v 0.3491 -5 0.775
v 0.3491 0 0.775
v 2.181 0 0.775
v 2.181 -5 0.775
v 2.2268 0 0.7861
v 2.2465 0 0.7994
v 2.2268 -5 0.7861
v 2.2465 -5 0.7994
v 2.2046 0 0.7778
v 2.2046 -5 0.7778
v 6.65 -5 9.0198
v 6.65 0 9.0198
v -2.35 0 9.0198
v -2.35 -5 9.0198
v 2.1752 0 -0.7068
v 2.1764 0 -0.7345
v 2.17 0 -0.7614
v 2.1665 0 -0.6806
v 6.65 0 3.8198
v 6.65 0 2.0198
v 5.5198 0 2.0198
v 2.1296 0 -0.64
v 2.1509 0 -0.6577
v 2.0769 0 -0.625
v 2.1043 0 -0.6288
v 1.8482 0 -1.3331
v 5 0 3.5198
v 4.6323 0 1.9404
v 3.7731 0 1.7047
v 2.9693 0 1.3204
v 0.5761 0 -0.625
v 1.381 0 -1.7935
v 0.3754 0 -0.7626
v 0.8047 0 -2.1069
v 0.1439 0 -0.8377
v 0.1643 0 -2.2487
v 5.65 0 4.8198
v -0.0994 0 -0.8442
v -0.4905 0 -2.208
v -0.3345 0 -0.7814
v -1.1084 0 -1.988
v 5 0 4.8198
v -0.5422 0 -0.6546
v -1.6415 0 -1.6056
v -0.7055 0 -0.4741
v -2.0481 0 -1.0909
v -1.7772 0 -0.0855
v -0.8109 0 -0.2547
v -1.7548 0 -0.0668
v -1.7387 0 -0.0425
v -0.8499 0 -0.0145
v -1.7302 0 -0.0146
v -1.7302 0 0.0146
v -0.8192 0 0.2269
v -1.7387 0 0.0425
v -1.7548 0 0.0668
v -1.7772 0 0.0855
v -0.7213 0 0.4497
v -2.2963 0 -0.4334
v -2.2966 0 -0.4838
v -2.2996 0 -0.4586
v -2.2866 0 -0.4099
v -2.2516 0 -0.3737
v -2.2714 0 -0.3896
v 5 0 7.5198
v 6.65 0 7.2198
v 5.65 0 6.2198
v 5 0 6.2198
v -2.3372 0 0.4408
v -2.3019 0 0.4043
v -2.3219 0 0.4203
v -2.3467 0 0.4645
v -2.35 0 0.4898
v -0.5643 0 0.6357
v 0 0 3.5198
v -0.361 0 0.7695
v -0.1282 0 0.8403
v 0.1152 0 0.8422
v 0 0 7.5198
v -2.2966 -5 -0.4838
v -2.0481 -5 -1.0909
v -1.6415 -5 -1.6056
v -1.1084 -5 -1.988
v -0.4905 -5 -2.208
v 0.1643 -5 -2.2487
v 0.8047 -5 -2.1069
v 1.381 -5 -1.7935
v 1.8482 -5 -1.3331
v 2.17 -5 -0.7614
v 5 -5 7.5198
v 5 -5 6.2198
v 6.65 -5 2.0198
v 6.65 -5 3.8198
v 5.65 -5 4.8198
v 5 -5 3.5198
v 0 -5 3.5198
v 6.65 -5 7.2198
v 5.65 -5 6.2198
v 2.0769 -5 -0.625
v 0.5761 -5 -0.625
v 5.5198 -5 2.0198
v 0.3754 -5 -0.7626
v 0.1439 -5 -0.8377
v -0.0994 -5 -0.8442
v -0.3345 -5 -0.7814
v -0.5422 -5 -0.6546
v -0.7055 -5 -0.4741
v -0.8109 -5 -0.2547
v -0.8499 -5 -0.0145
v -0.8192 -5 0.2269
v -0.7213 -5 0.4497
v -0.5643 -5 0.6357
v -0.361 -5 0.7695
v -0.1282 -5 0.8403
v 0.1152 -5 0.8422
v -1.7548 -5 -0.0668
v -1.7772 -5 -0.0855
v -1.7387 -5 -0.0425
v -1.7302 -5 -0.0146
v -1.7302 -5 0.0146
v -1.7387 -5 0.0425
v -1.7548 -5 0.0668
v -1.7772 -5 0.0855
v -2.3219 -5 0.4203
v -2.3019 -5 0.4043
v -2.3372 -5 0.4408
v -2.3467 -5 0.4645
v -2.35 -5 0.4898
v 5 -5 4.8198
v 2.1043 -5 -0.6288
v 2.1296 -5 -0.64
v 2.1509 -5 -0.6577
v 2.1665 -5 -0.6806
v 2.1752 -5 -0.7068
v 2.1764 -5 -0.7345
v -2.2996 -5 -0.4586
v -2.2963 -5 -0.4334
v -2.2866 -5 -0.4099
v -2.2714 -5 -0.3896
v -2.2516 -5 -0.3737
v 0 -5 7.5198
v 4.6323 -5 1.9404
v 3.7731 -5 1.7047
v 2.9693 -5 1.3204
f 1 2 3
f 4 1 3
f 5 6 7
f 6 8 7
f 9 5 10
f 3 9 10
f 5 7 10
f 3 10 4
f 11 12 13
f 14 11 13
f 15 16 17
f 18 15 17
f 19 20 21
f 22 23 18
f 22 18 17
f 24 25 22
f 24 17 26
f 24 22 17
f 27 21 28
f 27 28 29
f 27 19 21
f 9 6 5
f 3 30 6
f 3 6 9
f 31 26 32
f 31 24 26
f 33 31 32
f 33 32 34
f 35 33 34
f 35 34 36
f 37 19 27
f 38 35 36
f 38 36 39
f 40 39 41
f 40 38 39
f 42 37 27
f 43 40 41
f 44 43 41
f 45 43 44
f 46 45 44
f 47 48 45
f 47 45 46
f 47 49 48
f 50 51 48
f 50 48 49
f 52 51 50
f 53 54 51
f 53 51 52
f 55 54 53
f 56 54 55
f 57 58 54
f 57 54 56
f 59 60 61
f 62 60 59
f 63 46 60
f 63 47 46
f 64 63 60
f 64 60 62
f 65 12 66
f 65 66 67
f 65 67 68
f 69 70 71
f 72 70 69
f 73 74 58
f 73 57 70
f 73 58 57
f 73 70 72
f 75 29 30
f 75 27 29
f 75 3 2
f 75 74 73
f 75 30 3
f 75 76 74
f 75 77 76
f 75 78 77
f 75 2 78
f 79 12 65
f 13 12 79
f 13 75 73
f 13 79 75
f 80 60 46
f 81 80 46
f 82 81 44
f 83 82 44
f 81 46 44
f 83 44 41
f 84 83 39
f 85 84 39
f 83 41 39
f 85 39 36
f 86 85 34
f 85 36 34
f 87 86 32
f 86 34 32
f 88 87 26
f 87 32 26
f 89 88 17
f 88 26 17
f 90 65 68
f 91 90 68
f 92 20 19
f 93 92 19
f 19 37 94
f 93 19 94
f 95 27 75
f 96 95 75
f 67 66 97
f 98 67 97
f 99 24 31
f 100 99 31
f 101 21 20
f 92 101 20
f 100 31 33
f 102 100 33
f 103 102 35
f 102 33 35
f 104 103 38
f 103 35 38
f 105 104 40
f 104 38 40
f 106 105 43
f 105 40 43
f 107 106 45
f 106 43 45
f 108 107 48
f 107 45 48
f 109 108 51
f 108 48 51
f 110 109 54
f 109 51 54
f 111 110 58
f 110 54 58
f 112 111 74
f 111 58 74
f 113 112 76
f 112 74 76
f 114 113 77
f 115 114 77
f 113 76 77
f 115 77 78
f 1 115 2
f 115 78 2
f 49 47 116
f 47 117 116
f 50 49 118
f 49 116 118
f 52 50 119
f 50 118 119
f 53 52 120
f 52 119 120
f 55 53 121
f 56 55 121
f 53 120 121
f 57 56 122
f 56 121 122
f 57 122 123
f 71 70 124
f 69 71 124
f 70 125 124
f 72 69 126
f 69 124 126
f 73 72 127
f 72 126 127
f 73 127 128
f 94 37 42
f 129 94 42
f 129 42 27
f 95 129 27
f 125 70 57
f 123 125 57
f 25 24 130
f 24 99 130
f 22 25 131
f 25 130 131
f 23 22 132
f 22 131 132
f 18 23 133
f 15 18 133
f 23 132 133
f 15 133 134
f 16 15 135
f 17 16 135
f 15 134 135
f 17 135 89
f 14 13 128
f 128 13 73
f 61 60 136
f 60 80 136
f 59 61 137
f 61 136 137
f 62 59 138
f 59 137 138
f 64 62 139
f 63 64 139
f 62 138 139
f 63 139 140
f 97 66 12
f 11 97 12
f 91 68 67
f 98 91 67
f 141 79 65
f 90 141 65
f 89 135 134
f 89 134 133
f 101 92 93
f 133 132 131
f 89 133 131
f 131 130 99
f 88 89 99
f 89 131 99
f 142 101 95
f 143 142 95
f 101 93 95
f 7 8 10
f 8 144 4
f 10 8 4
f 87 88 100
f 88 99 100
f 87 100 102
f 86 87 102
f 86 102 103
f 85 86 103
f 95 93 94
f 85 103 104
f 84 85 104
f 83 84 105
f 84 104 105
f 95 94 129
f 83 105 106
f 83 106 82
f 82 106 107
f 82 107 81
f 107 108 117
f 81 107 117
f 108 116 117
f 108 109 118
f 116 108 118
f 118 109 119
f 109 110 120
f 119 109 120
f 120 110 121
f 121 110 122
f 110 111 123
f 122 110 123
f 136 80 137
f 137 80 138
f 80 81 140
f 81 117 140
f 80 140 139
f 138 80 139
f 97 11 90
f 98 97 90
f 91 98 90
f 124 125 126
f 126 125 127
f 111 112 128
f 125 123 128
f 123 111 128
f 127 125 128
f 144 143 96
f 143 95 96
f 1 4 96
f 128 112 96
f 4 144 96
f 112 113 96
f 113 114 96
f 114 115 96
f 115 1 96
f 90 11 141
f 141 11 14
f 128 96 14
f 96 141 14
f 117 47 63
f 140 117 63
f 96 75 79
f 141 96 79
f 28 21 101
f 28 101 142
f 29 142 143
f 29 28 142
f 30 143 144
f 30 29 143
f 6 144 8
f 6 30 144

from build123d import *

# Parameters (mm, degrees)
F1_DEPTH    = 5
F2_SIZE     = 1
F3_T1_DEPTH = 5
F4_R        = 0.1


# Not quite as in the source:
# - a fillet or chamfer that OpenCascade refuses, or shapes differently, is made with other operations: its cross-section is extruded or revolved along the edge and cut away or added


with BuildPart() as f1:
    # F0 (on Front) → F1 (new body)
    with BuildSketch(Plane.XZ):
        with BuildLine():
            ThreePointArc((0.5760859311, -0.625), (-0.8390441156, -0.1360329819), (0.3491060011, 0.775))
            Line((0.3491060011, 0.775), (2.2185299187, 0.775))
            Line((2.2185299187, 0.775), (2.2185299187, 2.0197594836))
            Line((2.2185299187, 2.0197594836), (6.65, 2.0197594836))
            Line((6.65, 2.0197594836), (6.65, 4.8197594836))
            Line((6.65, 4.8197594836), (5, 4.8197594836))
            Line((5, 4.8197594836), (5, 3.5197594836))
            Line((5, 3.5197594836), (0, 3.5197594836))
            Line((0, 3.5197594836), (0, 7.5197594836))
            Line((0, 7.5197594836), (5, 7.5197594836))
            Line((5, 7.5197594836), (5, 6.2197594836))
            Line((5, 6.2197594836), (6.65, 6.2197594836))
            Line((6.65, 6.2197594836), (6.65, 9.0197594836))
            Line((6.65, 9.0197594836), (-2.35, 9.0197594836))
            Line((-2.35, 9.0197594836), (-2.35, 0.4335492267))
            Line((-2.35, 0.4335492267), (-1.6366346435, 0))
            Line((-1.6366346435, 0), (-2.3136941642, -0.4114842822))
            ThreePointArc((-2.3136941642, -0.4114842822), (-0.1293198619, -2.2532607786), (2.2185299187, -0.625))
            Line((2.2185299187, -0.625), (0.5760859311, -0.625))
        make_face()
    extrude(amount=F1_DEPTH)

    # F2
    f2_edges = [f1.edges().sort_by_distance(p)[0] for p in [
        (6.65, -2.5, 6.219759),
        (6.65, -2.5, 4.819759),
    ]]
    chamfer(f2_edges, length=F2_SIZE)

    # F3: fillet of radius 5 on 1 edges, made by hand

    # F3_s2 → F3_t1 (join)
    with BuildSketch(Plane.XZ):
        with BuildLine():
            ThreePointArc((5.5197673631, 2.0197594836), (3.7557099068, 1.6982315944), (2.2185299187, 0.775))
            Line((2.2185299187, 0.775), (2.2185299187, 2.0197594836))
            Line((2.2185299187, 2.0197594836), (5.5197673631, 2.0197594836))
        make_face()
    extrude(amount=F3_T1_DEPTH)

    # F4
    f4_edges = [f1.edges().sort_by_distance(p)[0] for p in [
        (-1.636635, -2.5, 0),
        (-2.313694, -2.5, -0.411484),
        (-2.35, -2.5, 0.433549),
        (2.21853, -2.5, -0.625),
        (2.21853, -2.5, 0.775),
    ]]
    fillet(f4_edges, radius=F4_R)


solid = f1.part
